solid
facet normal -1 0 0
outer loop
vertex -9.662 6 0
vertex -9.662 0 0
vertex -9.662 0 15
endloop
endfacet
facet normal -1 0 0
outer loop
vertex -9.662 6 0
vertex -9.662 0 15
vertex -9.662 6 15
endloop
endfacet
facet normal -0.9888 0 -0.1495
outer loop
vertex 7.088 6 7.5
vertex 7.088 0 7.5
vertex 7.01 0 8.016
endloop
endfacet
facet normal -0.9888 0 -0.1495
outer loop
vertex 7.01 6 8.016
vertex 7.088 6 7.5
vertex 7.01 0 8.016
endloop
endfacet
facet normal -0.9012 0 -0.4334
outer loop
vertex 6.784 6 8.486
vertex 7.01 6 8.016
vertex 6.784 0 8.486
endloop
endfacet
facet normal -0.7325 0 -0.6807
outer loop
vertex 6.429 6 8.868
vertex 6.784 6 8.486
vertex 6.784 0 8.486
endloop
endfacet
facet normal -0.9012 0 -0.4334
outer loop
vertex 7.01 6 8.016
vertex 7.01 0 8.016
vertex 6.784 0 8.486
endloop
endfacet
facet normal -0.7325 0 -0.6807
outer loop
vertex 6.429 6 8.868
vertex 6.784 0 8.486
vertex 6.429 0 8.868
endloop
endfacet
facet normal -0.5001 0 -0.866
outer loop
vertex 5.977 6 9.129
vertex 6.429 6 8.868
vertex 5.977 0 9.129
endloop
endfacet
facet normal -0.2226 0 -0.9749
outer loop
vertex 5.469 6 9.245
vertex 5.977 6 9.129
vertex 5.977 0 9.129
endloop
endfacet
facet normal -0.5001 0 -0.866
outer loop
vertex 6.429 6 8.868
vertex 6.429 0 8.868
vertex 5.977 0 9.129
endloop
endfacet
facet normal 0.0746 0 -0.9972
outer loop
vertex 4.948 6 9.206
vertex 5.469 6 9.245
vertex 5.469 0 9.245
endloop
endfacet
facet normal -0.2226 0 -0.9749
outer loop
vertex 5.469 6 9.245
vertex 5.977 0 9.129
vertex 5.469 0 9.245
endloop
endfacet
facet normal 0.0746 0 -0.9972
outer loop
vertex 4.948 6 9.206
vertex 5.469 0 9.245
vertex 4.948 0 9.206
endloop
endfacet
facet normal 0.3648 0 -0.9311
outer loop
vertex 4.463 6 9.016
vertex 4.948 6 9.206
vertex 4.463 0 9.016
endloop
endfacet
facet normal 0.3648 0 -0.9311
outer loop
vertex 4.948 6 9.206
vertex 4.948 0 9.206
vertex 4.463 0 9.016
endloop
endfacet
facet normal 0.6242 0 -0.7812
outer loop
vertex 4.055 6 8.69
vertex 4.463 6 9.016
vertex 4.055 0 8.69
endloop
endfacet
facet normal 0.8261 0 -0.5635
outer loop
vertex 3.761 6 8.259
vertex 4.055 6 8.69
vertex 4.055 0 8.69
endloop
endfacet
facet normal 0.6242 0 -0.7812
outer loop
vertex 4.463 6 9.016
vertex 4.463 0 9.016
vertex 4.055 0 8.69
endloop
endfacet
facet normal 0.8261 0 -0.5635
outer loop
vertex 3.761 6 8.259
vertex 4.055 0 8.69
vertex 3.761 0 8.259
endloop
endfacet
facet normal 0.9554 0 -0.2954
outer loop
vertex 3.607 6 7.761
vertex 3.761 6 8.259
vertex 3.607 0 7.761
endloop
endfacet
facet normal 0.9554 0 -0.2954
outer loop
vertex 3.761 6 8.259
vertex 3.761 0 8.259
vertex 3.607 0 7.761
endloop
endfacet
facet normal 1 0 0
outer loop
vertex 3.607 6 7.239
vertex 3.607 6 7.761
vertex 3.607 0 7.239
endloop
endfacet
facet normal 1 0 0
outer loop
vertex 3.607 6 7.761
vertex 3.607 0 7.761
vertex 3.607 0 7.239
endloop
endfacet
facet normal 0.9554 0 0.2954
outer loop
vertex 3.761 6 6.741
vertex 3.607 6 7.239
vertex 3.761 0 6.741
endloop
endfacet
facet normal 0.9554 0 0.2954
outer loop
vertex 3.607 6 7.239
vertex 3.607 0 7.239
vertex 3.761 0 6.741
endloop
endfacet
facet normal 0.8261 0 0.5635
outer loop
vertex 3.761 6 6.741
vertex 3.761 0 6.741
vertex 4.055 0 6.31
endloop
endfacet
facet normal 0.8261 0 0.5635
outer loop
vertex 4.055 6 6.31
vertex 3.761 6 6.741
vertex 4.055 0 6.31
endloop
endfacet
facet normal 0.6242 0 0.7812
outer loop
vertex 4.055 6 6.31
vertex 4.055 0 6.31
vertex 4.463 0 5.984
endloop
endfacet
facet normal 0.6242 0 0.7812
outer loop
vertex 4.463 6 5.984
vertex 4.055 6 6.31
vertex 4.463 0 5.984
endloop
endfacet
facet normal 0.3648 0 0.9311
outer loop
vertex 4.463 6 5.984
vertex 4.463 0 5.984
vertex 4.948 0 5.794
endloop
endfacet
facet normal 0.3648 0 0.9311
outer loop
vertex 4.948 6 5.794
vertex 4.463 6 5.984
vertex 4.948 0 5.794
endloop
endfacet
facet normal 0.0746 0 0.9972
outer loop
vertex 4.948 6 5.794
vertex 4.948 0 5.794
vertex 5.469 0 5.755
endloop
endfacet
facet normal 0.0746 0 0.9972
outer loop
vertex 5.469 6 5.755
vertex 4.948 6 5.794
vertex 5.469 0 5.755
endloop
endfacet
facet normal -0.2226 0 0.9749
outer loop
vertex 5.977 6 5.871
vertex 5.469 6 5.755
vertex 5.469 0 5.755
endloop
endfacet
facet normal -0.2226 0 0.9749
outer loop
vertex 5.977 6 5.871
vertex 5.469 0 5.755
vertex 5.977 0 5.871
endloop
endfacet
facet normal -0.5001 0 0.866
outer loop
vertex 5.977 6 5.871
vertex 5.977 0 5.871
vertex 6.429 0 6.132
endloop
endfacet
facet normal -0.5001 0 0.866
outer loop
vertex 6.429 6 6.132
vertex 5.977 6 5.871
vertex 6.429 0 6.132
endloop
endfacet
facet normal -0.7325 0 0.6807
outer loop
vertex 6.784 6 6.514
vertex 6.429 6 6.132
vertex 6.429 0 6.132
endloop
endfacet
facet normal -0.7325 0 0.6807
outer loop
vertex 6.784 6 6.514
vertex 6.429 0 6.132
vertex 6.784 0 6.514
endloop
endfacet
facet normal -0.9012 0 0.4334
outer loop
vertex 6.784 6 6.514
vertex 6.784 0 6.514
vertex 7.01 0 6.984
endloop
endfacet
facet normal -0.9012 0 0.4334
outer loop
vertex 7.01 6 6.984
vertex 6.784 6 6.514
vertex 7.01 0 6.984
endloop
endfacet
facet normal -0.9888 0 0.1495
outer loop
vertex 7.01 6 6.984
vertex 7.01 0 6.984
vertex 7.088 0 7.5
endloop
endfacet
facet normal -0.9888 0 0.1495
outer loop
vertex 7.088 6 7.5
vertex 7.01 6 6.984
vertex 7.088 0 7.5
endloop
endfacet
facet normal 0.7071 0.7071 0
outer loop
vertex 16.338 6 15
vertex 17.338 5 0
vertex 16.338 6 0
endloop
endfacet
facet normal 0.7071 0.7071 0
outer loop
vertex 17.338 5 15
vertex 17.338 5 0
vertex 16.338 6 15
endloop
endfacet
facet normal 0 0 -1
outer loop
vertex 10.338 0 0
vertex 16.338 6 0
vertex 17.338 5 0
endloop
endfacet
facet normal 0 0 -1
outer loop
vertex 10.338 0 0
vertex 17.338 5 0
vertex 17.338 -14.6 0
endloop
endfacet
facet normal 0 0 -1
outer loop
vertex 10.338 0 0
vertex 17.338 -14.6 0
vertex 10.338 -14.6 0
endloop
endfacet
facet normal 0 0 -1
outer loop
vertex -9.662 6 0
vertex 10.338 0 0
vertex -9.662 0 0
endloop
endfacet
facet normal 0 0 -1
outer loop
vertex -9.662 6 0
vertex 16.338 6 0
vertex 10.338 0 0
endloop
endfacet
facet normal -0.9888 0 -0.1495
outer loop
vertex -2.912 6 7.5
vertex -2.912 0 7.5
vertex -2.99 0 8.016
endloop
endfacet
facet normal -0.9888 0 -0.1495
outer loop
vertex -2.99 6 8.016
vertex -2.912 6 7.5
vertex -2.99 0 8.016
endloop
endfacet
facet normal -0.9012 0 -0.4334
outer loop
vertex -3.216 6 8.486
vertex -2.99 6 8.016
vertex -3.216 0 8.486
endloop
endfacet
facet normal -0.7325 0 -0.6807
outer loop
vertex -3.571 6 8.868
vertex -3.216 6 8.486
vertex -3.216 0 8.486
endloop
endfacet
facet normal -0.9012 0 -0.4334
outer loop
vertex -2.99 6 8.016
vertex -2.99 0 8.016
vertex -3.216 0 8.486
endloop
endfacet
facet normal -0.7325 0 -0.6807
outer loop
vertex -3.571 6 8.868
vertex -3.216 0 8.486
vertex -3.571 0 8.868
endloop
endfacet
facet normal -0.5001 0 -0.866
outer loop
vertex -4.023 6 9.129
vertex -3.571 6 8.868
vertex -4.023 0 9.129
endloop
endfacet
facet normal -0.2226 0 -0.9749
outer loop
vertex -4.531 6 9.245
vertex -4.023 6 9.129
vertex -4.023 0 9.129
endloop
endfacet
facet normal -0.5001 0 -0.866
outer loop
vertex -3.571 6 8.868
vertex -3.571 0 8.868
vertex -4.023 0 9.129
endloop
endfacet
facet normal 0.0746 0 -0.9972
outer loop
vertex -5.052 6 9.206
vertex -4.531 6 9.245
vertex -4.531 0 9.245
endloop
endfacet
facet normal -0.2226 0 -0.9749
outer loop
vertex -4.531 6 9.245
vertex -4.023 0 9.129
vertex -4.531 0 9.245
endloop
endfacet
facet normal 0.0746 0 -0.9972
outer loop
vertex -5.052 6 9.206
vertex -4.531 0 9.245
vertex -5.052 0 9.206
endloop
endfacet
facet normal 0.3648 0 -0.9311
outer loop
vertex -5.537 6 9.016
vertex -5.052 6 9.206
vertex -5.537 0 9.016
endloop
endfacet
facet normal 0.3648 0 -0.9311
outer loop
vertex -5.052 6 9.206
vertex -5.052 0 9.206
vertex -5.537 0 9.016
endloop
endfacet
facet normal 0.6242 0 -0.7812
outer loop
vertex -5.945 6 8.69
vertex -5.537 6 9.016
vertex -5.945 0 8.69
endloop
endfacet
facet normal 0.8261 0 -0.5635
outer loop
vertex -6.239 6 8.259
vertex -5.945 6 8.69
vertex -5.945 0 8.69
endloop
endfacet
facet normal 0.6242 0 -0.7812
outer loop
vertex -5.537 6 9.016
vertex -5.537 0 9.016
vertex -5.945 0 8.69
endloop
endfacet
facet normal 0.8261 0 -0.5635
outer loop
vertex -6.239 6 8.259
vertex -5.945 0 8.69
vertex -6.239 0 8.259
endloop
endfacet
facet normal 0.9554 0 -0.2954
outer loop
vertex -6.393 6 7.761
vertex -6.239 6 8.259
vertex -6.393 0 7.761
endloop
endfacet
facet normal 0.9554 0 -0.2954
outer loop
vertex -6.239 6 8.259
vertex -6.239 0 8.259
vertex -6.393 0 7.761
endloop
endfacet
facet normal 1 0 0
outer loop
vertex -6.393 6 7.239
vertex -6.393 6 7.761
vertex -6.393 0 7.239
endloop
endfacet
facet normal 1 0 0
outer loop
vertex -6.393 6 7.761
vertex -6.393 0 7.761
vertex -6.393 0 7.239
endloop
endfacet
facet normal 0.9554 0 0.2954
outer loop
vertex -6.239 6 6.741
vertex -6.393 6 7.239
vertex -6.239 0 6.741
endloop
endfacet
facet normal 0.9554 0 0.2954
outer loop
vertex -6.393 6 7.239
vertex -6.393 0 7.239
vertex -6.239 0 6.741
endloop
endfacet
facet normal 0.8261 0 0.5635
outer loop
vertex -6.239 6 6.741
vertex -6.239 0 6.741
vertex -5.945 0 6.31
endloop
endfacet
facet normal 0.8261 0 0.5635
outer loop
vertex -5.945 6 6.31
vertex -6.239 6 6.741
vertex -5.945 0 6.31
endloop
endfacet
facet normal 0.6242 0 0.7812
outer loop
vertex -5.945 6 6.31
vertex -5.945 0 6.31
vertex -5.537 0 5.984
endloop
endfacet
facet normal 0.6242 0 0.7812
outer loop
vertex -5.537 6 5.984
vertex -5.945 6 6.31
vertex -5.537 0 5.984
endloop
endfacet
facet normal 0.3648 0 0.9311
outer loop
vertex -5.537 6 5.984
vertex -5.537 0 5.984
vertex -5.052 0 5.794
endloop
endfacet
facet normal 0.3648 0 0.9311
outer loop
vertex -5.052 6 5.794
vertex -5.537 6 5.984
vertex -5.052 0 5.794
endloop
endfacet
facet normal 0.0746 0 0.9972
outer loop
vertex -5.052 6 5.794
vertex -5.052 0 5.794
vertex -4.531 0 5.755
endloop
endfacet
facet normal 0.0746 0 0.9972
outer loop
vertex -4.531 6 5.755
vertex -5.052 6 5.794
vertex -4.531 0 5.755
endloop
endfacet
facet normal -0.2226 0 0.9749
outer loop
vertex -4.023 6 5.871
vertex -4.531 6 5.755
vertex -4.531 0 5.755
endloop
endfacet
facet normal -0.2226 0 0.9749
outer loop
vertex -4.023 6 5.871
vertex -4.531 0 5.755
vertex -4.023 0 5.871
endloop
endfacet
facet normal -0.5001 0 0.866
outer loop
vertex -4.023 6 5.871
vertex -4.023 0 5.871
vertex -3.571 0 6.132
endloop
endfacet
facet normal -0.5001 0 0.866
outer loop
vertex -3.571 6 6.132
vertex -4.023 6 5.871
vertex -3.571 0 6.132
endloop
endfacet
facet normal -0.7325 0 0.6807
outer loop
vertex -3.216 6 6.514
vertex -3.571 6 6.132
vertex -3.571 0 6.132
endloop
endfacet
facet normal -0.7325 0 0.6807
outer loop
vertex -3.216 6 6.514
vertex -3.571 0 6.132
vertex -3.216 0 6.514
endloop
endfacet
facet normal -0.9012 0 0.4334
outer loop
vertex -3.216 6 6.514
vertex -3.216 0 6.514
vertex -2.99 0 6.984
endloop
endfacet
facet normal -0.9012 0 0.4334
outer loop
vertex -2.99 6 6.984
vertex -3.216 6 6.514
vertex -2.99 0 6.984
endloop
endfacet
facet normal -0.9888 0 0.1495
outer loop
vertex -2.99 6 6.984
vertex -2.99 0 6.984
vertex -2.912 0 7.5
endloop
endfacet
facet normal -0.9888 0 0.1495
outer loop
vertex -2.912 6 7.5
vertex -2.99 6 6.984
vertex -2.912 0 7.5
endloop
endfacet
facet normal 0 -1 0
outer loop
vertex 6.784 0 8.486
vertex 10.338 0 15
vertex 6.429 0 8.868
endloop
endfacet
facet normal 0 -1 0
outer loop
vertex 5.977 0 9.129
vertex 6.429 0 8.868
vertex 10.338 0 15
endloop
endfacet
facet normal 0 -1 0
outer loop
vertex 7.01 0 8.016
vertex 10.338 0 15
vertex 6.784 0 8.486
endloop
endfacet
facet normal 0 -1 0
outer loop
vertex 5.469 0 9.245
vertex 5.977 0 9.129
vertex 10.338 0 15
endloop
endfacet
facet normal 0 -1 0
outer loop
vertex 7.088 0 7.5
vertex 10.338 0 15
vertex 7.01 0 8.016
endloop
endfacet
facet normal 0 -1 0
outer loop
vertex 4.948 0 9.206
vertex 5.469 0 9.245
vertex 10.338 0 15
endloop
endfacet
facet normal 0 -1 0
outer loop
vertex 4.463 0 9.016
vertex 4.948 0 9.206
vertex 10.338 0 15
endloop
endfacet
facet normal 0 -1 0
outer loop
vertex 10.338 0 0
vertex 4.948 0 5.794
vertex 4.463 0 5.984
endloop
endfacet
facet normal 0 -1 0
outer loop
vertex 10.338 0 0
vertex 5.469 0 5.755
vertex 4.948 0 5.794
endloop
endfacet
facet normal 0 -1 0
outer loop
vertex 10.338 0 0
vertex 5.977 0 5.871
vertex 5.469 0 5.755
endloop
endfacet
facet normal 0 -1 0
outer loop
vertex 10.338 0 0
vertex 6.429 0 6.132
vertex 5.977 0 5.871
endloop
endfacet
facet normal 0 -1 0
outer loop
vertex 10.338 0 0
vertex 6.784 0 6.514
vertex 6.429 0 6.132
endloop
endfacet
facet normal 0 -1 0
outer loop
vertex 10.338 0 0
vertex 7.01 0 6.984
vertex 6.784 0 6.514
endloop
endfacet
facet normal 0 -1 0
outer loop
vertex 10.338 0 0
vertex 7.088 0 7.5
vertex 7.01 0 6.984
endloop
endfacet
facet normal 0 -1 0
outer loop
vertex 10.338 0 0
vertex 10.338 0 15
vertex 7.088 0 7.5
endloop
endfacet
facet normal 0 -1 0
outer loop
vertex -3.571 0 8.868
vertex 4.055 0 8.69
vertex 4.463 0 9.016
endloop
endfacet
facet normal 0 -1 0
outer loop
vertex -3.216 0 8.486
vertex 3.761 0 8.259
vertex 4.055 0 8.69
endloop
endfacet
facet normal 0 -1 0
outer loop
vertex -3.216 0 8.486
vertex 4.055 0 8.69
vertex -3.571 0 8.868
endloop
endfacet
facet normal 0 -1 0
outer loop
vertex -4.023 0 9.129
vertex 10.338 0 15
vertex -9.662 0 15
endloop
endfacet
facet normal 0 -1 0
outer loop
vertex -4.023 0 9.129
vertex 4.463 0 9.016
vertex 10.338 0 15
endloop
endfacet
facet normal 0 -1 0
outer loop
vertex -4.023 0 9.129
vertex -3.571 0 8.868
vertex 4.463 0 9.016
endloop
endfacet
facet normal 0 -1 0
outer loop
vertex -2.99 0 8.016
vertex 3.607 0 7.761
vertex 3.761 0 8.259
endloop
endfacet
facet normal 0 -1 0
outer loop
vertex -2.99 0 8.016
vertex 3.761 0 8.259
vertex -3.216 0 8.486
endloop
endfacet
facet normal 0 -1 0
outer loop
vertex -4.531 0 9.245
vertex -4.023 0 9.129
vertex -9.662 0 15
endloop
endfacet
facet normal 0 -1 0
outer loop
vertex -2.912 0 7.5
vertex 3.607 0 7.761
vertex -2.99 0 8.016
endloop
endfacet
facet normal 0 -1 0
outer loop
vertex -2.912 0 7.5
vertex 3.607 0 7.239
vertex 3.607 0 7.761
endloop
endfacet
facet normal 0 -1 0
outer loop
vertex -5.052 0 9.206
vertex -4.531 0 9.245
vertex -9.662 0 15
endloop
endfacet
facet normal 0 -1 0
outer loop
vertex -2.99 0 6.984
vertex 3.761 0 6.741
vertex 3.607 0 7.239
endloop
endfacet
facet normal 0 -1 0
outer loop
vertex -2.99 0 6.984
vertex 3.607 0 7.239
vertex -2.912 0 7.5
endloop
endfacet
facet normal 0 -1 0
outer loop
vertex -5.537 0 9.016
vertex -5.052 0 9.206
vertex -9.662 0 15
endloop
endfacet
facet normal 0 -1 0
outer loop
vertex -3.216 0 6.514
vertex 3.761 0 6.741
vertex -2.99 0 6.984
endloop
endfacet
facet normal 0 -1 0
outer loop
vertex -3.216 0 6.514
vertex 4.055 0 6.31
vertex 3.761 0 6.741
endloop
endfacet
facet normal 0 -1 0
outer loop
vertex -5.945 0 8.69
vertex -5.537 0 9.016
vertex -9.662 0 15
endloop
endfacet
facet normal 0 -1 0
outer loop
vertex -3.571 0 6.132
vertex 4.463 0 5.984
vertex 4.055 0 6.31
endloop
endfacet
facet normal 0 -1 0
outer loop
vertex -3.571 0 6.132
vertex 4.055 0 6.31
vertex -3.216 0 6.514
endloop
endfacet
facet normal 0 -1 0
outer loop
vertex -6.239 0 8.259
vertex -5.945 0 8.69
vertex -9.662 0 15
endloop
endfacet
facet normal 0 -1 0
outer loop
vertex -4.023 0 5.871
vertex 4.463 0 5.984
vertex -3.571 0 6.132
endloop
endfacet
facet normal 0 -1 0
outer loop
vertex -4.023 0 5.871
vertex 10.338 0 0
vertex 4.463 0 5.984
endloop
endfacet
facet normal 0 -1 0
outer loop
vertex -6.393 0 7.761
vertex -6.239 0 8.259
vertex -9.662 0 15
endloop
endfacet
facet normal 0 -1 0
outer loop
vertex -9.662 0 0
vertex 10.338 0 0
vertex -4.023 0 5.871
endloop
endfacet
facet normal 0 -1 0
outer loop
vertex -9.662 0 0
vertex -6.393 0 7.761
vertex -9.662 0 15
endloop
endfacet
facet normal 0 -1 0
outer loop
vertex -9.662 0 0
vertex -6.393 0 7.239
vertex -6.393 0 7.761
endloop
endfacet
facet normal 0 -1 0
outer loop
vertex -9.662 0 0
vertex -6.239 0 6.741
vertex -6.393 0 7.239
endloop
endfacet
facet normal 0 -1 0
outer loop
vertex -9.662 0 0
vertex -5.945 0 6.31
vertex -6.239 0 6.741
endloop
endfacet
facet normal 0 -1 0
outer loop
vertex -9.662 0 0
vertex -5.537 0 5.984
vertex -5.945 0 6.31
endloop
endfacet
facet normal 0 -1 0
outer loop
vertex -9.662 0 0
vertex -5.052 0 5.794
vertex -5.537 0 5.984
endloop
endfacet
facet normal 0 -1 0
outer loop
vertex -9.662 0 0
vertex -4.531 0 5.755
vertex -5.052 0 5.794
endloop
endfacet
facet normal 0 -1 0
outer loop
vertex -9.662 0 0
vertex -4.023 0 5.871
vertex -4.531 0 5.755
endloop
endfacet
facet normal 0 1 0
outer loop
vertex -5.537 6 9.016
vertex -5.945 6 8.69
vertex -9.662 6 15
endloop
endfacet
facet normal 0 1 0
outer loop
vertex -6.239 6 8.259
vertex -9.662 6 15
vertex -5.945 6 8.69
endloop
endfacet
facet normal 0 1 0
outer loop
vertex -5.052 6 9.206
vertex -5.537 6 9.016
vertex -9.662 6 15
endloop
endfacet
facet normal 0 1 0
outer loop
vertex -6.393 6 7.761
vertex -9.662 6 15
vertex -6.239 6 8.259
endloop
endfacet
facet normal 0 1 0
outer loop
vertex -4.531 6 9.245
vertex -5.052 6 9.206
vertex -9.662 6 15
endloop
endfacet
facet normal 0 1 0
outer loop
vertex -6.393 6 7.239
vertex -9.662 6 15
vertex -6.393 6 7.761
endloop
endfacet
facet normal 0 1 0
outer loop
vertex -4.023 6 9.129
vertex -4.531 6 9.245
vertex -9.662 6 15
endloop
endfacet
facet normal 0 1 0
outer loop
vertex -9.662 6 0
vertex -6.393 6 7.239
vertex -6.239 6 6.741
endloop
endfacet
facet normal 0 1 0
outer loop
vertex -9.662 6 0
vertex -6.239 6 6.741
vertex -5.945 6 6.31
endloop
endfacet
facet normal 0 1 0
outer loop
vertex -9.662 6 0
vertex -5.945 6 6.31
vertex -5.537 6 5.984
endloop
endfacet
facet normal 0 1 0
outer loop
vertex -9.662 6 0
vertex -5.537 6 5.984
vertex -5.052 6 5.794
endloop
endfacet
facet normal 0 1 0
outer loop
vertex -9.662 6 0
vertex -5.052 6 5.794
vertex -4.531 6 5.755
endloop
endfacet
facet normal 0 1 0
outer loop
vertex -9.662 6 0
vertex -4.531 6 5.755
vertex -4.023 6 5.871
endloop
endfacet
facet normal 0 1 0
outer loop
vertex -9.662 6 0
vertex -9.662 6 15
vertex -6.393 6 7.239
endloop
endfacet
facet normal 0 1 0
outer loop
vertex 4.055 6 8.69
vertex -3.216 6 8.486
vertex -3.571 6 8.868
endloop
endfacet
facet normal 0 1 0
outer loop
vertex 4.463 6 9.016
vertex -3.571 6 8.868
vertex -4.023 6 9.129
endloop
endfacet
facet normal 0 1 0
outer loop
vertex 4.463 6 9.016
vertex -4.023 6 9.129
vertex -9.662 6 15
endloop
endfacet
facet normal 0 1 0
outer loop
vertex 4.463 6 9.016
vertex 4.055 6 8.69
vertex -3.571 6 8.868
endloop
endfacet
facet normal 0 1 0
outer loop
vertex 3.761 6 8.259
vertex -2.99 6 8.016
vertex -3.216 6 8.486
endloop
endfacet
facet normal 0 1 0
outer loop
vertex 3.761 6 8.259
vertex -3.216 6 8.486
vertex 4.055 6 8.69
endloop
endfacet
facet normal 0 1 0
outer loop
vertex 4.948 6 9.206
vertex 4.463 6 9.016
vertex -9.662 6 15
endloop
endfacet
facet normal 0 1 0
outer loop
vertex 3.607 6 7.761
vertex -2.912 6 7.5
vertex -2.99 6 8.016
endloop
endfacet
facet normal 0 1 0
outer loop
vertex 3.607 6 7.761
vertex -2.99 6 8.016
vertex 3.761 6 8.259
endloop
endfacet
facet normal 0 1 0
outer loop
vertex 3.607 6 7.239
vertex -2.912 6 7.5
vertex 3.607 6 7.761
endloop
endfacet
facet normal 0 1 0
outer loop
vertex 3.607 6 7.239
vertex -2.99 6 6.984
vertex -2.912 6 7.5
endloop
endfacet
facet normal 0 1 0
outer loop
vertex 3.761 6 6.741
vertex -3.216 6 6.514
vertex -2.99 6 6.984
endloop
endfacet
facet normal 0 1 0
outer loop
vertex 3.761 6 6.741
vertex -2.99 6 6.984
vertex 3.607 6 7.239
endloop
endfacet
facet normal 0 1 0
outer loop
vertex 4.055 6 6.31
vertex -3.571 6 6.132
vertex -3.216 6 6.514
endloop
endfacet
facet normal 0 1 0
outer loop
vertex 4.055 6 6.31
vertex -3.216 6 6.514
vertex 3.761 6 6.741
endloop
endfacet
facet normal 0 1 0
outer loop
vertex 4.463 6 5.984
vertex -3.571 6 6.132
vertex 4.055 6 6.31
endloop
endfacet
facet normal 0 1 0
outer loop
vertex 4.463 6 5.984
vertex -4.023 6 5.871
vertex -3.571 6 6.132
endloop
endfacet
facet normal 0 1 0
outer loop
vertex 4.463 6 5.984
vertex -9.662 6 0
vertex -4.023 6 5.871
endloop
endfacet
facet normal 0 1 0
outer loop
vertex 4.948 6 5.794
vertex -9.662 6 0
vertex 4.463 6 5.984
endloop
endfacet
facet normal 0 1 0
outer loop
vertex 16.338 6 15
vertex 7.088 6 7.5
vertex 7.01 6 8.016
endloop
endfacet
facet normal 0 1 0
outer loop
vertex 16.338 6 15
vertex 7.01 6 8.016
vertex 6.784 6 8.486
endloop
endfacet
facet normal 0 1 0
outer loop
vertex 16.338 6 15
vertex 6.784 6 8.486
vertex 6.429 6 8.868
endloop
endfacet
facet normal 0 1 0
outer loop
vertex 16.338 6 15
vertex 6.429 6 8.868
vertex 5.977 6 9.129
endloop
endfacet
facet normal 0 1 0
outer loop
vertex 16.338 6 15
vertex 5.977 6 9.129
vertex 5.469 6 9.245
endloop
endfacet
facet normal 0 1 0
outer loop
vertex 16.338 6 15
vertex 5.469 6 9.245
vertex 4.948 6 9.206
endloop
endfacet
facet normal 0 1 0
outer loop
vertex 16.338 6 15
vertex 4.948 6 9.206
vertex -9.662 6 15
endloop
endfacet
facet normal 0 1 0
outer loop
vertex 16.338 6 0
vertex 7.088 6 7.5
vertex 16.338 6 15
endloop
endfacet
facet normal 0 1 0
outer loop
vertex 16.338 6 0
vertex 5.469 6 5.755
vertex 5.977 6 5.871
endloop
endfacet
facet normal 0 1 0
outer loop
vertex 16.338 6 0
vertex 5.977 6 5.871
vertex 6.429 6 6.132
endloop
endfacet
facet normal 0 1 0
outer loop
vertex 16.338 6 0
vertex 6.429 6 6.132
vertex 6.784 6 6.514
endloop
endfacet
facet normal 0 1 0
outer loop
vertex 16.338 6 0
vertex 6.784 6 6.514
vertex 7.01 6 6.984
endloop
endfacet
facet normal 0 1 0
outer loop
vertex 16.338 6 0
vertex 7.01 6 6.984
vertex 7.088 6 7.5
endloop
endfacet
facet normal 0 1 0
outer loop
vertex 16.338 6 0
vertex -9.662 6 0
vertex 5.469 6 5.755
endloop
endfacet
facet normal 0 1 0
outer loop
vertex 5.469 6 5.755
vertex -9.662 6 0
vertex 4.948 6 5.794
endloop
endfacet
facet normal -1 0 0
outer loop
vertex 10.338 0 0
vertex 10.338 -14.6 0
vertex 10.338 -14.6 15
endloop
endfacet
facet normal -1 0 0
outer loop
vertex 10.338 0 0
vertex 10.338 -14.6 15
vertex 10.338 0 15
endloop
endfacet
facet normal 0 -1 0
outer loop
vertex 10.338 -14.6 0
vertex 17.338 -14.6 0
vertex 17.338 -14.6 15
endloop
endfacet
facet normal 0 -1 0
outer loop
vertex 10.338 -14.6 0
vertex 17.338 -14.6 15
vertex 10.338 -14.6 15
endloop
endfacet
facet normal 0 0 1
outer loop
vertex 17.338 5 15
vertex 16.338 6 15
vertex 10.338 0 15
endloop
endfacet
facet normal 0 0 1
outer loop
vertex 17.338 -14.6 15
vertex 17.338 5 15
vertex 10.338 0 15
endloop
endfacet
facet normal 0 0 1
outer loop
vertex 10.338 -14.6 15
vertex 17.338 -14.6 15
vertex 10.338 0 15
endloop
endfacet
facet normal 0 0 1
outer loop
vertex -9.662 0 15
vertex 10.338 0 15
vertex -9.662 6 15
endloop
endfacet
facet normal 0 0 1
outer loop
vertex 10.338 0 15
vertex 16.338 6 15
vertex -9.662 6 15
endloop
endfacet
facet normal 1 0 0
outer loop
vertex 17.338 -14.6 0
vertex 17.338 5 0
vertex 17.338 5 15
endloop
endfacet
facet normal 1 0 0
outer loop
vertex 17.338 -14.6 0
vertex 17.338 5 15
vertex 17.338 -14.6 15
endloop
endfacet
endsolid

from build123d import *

# Parameters (mm, degrees)
BOSS_EXTRUDE1_DEPTH = 15
CHAMFER1_SIZE       = 1
SKETCH2_R           = 1.75
CUT_EXTRUDE1_DEPTH  = 7


with BuildPart() as part:
    # Sketch1 → Boss-Extrude1 (new body)
    with BuildSketch(Plane.XY):
        Polygon((-9.662207358, 6), (17.337792642, 6), (17.337792642, -14.6), (10.337792642, -14.6), (10.337792642, 0), (-9.662207358, 0), align=None)
    extrude(amount=BOSS_EXTRUDE1_DEPTH)

    # Chamfer1
    chamfer1_edges = [part.edges().sort_by_distance(p)[0] for p in [
        (17.337792642, 6, 7.5),
    ]]
    chamfer(chamfer1_edges, length=CHAMFER1_SIZE)

    # Sketch2 → Cut-Extrude1 (cut, through all)
    with BuildSketch(Plane.XZ):
        with Locations((-4.662207358, 7.5)):
            Circle(SKETCH2_R)
        with Locations((5.337792642, 7.5)):
            Circle(SKETCH2_R)
    extrude(amount=-CUT_EXTRUDE1_DEPTH, mode=Mode.SUBTRACT)


solid = part.part
